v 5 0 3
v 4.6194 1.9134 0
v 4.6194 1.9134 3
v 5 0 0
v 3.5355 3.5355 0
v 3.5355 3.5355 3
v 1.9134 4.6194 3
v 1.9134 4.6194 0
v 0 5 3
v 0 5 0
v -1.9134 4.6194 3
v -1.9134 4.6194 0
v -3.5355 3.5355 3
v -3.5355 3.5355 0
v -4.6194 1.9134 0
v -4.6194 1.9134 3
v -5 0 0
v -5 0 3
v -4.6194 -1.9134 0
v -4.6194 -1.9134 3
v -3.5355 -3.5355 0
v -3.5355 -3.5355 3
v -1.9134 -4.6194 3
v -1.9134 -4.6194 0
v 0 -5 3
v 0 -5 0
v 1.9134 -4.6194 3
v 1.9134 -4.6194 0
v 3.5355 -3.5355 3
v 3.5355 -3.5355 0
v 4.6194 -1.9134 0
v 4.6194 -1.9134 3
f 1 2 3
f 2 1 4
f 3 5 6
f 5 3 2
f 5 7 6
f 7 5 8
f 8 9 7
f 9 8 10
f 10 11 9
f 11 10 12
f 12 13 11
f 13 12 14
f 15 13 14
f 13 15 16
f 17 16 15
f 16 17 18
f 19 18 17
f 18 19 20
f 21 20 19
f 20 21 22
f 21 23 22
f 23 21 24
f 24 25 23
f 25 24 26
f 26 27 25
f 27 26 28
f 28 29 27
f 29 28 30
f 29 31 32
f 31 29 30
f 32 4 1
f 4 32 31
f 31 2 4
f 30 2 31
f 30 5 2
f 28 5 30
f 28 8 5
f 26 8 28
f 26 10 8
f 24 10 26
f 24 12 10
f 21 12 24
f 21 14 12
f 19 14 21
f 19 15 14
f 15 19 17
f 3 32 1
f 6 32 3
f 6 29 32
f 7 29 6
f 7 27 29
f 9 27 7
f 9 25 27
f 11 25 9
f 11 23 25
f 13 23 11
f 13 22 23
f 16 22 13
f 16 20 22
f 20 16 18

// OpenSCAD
// Generated by SolidPython 1.0.1 on 2020-07-29 00:39:25


cylinder(h = 3, r1 = 5, r2 = 5);
/***********************************************
*********      SolidPython code:      **********
************************************************
 
# import packages: SolidPython
from solid import *
from solid.utils import *
from itertools import chain, combinations


class Resize:

    def __init__(self, scad_file):
        self.scad_file = scad_file
        #self.scad_file = import_scad(scad_file)
        # cone/cylinder param:
        self.r1 = 0
        self.r2 = 0
        self.h = 0
        # rectangular prism param:
        self.w = 0
        self.l = 0
        # ellipse param:
        self.r = 0

    # import OpenScad code (file name corresponds to shape)


    # classify shape + parameters
    def assign(self, param1, param2, param3):
        if self.scad_file == 'cone.scad':
            self.r1 = param1
            self.r2 = param2
            self.h = param3
        elif self.scad_file == 'cylinder.scad':
            self.r1 = param1
            self.r2 = param2
            self.h = param3
        elif self.scad_file == 'rectangularPrism.scad':
            self.h = param1
            self.l = param2
            self.w = param3
        else:
            self.r = param1
            self.h = param2

    # resize parameters
    def iterate(self):
        x = range(3, 20, 2)
        i = 1
        if self.scad_file == 'cone.scad':
            tempList = list(combinations(x, 2))
            for temp in tempList:
                param1 = temp[0]
                param2 = temp[1]
                filepath = 'produced_scad_files/' + 'cone' + str(param1) + '_' + str(param2) + '_' + '.scad'
                scad_render_to_file(cylinder(h=param1, r1=param2, r2=0), filepath)

        elif self.scad_file == 'cylinder.scad':
            tempList = list(combinations(x, 3))
            for temp in tempList:
                param1 = temp[0]
                param2 = temp[1]
                filepath = 'produced_scad_files/' + 'cylinder' + str(param1) + '_' + str(param2) + '_' + '.scad'
                scad_render_to_file(cylinder(h=param1, r1=param2, r2=param2), filepath)

        elif self.scad_file == 'rectangularPrism.scad':
            tempList = list(combinations(x, 3))
            for temp in tempList:
                param1 = temp[0]
                param2 = temp[1]
                param3 = temp[2]
                filepath = 'produced_scad_files/' + 'rectangularPrism' + str(param1) + '_' + str(param2) + '_' + str(
                    param3) + '.scad'
                scad_render_to_file(cube(size=(param1, param2, param3)), filepath)

        elif self.scad_file == 'ellipse.scad':
            tempList = list(combinations(x, 4))
            for temp in tempList:
                param1 = temp[0]
                param2 = temp[1]
                param3 = temp[2]
                param4 = temp[3]
                filepath = 'produced_scad_files/' + 'ellipse' + str(param1) + '_' + str(param2) + '_' + str(param3) + '_' + str(param4) + '.scad'
                scad_render_to_file(scale([param1, param2, param3])(sphere(r=param4)), filepath)

    def render_to_scadfile(self):
        scad_render_to_file(scad, 'example.scad') 
 
************************************************/
